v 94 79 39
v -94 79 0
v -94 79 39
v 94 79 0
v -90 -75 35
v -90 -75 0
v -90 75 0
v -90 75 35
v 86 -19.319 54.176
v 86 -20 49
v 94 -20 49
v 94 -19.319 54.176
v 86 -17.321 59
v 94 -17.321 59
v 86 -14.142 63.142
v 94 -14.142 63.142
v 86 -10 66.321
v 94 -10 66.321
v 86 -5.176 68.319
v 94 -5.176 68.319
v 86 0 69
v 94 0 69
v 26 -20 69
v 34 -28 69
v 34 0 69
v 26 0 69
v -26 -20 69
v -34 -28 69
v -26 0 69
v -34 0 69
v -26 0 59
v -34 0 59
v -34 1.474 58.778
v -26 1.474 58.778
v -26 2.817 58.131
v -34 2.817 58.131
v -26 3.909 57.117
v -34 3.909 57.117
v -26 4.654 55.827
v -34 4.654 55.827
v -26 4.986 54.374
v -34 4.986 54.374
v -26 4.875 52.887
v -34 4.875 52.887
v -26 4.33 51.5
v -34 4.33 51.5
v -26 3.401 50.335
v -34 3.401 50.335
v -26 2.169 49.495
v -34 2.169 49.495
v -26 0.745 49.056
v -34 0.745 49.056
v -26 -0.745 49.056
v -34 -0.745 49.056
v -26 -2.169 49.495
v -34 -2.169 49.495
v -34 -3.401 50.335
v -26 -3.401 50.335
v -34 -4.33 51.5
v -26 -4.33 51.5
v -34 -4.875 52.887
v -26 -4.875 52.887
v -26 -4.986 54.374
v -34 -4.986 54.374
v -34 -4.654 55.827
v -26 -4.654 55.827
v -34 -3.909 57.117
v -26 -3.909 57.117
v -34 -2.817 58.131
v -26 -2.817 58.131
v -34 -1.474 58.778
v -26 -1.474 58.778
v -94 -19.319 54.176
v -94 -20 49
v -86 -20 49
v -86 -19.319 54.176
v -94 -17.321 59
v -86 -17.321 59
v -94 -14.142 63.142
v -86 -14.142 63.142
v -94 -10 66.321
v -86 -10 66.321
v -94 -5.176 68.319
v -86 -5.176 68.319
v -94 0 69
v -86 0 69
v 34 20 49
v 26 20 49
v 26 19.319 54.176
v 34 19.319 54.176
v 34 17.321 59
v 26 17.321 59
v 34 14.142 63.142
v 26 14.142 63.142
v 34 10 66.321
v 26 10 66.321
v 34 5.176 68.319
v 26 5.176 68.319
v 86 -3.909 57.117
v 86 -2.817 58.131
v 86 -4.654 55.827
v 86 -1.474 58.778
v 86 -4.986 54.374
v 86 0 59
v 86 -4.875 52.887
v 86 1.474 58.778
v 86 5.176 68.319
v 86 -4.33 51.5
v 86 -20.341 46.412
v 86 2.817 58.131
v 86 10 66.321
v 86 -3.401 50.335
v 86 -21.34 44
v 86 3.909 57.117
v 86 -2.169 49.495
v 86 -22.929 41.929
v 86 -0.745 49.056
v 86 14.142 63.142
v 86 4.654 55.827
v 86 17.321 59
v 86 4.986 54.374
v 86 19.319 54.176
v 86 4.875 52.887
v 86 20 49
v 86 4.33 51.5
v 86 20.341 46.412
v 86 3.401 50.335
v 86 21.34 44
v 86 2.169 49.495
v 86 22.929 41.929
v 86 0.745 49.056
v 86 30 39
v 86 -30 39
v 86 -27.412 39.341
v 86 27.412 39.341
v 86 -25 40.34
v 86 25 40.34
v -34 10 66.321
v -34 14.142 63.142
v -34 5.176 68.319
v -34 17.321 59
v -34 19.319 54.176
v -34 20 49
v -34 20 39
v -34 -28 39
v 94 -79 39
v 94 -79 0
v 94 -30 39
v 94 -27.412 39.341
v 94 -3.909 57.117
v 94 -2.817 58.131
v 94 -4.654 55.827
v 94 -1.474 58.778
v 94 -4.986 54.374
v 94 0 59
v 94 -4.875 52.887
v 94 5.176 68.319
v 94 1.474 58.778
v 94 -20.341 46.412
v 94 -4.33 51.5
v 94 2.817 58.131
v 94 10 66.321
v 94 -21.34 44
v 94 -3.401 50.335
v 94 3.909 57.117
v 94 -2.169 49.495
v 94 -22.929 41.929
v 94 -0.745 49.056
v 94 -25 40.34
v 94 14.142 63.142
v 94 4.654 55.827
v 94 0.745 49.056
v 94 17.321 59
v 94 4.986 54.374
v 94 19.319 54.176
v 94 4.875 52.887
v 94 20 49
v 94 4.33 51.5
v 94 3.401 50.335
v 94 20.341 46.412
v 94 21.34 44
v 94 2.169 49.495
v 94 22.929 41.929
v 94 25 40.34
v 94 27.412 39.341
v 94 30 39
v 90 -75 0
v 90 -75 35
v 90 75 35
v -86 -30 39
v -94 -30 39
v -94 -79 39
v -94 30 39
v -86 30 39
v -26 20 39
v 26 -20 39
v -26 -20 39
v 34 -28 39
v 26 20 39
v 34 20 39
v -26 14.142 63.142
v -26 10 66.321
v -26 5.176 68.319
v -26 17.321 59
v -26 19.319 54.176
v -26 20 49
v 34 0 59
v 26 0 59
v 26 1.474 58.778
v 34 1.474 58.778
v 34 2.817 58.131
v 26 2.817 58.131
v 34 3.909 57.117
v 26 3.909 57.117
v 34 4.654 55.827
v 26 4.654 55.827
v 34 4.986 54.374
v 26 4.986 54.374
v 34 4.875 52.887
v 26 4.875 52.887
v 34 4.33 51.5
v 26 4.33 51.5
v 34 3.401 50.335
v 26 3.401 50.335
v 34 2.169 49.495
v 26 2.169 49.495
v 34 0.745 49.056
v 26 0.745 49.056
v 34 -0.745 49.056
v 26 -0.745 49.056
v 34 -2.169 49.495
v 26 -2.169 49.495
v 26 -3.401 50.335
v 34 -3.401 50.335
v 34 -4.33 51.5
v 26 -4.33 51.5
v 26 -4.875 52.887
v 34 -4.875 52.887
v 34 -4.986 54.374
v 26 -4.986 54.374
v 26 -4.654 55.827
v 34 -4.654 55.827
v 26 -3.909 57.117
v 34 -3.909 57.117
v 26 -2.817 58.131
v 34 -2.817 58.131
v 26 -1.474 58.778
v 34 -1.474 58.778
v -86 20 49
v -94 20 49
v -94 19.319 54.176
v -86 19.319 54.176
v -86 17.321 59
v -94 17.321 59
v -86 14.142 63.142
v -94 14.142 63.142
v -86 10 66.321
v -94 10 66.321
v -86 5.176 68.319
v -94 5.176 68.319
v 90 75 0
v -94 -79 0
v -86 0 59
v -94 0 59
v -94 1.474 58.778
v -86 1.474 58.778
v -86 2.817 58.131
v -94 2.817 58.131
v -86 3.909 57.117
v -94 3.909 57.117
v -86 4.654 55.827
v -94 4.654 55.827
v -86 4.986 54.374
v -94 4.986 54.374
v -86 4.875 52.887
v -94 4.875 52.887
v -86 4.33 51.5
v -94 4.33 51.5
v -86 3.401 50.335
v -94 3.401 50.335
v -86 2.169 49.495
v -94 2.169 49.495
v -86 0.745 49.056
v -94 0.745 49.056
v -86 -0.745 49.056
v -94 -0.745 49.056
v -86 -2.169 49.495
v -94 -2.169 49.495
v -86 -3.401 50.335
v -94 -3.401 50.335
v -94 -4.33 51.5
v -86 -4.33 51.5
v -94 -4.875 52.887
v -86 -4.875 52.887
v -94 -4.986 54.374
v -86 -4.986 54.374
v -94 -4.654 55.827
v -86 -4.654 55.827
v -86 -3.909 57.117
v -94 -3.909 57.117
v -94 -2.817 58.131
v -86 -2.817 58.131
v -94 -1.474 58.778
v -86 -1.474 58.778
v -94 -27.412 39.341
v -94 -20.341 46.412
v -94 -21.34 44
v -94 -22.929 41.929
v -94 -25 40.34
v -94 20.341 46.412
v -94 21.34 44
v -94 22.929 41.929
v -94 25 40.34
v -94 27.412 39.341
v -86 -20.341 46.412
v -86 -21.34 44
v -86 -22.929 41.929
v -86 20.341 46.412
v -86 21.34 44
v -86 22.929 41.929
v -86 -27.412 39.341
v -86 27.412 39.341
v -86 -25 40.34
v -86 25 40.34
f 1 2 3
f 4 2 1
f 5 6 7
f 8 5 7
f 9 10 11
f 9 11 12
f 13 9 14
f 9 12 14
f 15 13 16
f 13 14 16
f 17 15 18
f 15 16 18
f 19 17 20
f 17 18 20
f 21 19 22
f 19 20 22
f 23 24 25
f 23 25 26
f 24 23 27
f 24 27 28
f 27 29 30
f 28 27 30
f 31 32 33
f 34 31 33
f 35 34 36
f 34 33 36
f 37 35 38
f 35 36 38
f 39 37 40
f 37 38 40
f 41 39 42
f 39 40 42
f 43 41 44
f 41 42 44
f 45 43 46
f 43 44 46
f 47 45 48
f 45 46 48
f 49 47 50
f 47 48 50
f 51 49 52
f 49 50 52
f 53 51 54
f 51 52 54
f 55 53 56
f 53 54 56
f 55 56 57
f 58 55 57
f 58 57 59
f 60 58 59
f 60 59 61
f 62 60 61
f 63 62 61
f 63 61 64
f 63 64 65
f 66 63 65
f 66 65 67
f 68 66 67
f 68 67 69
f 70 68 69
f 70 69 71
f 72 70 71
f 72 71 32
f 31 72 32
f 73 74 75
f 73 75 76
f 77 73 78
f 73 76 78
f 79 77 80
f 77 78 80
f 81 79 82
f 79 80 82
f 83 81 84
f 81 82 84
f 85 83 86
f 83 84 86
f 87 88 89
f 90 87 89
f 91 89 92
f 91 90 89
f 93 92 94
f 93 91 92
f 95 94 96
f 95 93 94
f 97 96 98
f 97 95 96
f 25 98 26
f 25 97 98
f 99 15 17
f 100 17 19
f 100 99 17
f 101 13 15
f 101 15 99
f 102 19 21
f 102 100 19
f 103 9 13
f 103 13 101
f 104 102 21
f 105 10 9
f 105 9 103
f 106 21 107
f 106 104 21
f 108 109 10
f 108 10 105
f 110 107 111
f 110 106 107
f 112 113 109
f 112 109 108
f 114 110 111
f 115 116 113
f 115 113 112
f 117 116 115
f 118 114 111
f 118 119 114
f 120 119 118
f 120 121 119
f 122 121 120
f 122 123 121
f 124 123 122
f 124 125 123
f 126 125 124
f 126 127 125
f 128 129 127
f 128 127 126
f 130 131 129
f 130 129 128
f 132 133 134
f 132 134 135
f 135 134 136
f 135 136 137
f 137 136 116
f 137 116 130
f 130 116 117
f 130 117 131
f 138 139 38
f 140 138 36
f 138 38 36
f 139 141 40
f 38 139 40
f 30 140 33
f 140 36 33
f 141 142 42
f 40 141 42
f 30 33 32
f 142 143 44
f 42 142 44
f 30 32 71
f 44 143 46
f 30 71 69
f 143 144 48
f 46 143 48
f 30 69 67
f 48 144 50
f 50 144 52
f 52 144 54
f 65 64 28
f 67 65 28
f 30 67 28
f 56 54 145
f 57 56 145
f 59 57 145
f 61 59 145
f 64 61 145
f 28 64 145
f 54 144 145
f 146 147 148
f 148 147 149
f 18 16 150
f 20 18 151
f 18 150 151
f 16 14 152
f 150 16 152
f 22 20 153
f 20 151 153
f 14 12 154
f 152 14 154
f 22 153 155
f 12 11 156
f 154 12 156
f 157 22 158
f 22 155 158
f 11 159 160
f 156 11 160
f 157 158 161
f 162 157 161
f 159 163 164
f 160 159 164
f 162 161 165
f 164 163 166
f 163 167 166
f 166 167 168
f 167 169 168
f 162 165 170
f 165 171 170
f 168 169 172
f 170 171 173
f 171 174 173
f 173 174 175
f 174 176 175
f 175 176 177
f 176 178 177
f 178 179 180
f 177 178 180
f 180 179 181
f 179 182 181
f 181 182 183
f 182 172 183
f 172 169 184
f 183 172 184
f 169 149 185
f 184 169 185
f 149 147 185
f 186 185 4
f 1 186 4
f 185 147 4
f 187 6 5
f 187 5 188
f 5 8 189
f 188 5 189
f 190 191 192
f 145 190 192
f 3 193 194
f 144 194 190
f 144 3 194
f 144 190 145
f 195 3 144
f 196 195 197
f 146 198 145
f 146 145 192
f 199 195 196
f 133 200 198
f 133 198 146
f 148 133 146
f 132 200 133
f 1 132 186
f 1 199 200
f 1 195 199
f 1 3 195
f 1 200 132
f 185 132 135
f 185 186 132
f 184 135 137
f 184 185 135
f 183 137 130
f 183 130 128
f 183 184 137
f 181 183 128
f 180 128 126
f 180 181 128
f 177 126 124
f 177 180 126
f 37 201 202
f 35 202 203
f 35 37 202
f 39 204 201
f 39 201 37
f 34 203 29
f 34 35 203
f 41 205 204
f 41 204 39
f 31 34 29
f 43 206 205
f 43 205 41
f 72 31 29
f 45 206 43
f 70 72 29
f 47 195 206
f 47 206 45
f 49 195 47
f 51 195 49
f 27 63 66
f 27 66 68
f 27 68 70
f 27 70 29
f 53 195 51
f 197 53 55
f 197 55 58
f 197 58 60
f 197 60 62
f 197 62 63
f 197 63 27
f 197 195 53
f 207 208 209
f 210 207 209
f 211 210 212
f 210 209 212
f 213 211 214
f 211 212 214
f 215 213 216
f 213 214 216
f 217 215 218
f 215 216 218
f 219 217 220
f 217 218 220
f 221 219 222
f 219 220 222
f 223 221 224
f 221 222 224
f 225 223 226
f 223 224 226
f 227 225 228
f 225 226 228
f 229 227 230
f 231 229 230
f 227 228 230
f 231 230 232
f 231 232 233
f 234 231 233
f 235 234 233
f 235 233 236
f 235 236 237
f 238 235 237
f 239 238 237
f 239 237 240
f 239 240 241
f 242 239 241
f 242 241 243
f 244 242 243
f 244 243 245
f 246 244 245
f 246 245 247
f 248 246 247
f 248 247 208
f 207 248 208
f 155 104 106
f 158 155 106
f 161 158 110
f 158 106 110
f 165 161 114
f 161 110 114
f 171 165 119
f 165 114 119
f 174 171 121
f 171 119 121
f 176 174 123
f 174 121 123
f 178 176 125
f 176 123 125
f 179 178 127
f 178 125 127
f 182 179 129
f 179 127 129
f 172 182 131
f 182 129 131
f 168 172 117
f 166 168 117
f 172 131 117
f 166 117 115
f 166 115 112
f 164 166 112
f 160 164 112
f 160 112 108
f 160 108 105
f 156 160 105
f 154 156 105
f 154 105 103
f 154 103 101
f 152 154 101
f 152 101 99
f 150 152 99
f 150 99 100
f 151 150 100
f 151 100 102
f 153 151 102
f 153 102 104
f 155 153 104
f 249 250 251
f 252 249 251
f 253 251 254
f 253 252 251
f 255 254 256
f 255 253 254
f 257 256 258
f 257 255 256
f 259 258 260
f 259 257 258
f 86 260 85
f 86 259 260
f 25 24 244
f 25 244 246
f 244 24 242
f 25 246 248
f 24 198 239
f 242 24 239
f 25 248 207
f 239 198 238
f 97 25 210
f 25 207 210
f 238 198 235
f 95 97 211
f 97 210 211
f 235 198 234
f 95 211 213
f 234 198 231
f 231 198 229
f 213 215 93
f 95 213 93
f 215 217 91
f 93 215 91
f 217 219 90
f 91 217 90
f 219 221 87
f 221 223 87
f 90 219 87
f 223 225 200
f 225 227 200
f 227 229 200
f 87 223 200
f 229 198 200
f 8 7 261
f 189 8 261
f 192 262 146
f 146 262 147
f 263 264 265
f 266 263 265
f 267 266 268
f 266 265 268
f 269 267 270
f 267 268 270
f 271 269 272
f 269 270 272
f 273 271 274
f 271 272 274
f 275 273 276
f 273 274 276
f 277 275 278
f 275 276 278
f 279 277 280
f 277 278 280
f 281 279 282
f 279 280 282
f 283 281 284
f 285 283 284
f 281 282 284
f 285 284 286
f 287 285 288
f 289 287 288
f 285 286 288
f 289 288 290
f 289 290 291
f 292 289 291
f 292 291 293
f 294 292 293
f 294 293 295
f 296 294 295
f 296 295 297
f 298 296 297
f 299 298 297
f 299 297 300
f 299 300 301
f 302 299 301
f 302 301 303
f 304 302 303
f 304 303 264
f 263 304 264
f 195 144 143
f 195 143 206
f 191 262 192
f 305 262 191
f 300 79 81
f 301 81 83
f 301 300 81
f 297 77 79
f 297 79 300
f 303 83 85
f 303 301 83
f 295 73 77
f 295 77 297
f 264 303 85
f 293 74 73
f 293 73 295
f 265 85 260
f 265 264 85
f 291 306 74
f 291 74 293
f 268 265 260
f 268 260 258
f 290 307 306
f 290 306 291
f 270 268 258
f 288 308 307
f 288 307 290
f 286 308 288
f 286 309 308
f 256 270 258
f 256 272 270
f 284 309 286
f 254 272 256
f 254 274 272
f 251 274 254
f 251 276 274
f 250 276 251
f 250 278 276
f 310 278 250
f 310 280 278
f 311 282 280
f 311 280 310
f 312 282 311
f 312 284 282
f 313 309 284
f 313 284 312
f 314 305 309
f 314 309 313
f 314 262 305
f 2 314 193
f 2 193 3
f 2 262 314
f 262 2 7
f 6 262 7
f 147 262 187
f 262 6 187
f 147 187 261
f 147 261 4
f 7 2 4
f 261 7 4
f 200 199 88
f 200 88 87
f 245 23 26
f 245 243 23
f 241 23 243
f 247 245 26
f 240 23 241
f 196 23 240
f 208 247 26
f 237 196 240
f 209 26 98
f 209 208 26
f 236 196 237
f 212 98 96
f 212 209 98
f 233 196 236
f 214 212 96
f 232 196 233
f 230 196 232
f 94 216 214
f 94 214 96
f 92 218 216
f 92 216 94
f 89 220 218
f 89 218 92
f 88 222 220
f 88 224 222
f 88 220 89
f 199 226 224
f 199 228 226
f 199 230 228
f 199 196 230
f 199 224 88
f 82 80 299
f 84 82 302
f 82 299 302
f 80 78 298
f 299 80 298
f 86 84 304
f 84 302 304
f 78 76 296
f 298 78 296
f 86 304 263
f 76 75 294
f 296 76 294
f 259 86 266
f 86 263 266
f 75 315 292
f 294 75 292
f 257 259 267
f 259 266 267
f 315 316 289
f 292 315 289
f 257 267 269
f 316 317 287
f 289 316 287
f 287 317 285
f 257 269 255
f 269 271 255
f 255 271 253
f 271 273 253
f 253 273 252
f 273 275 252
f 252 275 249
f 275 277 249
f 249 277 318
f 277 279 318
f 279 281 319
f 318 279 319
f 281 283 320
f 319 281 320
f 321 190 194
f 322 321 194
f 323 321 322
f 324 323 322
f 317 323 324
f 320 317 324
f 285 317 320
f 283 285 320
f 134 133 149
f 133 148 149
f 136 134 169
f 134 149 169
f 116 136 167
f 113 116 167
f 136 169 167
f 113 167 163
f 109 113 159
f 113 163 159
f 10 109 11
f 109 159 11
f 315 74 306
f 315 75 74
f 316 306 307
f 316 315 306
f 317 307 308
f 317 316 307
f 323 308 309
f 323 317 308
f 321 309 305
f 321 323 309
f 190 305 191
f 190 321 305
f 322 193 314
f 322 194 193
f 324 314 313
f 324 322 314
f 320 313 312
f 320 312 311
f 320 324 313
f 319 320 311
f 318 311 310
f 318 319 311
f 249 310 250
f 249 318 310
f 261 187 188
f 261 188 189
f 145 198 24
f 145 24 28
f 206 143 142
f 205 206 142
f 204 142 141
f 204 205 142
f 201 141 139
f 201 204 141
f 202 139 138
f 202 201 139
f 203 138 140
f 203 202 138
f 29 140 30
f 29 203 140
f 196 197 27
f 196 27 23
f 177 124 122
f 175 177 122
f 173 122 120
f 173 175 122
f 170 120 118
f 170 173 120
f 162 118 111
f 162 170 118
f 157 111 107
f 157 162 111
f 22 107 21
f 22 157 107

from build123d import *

# Parameters (mm, degrees)
SKIZZE1_W                       = 188
SKIZZE1_H                       = 158
AUFSATZ_LINEAR_AUSTRAGEN1_DEPTH = 39
SKIZZE2_W                       = 180
SKIZZE2_H                       = 150
SCHNITT_LINEAR_AUSTRAGEN1_DEPTH = 35
SKIZZE3_W                       = 8
SKIZZE3_H                       = 40
AUFSATZ_LINEAR_AUSTRAGEN2_DEPTH = 30
VERRUNDUNG1_R                   = 20
SKIZZE4_R                       = 5
SCHNITT_LINEAR_AUSTRAGEN2_DEPTH = 208
VERRUNDUNG2_R                   = 10


with BuildPart() as part:
    # Skizze1 → Aufsatz-Linear austragen1 (new body)
    with BuildSketch(Plane.XY):
        Rectangle(SKIZZE1_W, SKIZZE1_H)
    extrude(amount=AUFSATZ_LINEAR_AUSTRAGEN1_DEPTH)

    # Skizze2 → Schnitt-Linear austragen1 (cut)
    with BuildSketch(Plane.XY):
        Rectangle(SKIZZE2_W, SKIZZE2_H)
    extrude(amount=SCHNITT_LINEAR_AUSTRAGEN1_DEPTH, mode=Mode.SUBTRACT)

    # Skizze3 → Aufsatz-Linear austragen2 (add)
    with BuildSketch(Plane.XY.offset(39)):
        with Locations((-90, 0)):
            Rectangle(SKIZZE3_W, SKIZZE3_H)
        Polygon((-34, 20), (-26, 20), (-26, -20), (26, -20), (26, 20), (34, 20), (34, -20), (34, -28), (-34, -28), (-34, -20), align=None)
        with Locations((90, 0)):
            Rectangle(SKIZZE3_W, SKIZZE3_H)
    extrude(amount=AUFSATZ_LINEAR_AUSTRAGEN2_DEPTH)

    # Verrundung1
    verrundung1_edges = [part.edges().sort_by_distance(p)[0] for p in [
        (-90, -20, 69),
        (-90, 20, 69),
        (30, 20, 69),
        (-30, 20, 69),
        (90, -20, 69),
        (90, 20, 69),
    ]]
    fillet(verrundung1_edges, radius=VERRUNDUNG1_R - 0.0001)  # a hair under: the kernel refuses the full size

    # Skizze4 → Schnitt-Linear austragen2 (cut)
    with BuildSketch(Plane.ZY.offset(94)):
        with Locations((54, 0)):
            Circle(SKIZZE4_R)
    extrude(amount=-SCHNITT_LINEAR_AUSTRAGEN2_DEPTH, mode=Mode.SUBTRACT)

    # Verrundung2
    verrundung2_edges = [part.edges().sort_by_distance(p)[0] for p in [
        (-90, 20, 39),
        (-90, -20, 39),
        (90, 20, 39),
        (90, -20, 39),
    ]]
    fillet(verrundung2_edges, radius=VERRUNDUNG2_R)


solid = part.part
